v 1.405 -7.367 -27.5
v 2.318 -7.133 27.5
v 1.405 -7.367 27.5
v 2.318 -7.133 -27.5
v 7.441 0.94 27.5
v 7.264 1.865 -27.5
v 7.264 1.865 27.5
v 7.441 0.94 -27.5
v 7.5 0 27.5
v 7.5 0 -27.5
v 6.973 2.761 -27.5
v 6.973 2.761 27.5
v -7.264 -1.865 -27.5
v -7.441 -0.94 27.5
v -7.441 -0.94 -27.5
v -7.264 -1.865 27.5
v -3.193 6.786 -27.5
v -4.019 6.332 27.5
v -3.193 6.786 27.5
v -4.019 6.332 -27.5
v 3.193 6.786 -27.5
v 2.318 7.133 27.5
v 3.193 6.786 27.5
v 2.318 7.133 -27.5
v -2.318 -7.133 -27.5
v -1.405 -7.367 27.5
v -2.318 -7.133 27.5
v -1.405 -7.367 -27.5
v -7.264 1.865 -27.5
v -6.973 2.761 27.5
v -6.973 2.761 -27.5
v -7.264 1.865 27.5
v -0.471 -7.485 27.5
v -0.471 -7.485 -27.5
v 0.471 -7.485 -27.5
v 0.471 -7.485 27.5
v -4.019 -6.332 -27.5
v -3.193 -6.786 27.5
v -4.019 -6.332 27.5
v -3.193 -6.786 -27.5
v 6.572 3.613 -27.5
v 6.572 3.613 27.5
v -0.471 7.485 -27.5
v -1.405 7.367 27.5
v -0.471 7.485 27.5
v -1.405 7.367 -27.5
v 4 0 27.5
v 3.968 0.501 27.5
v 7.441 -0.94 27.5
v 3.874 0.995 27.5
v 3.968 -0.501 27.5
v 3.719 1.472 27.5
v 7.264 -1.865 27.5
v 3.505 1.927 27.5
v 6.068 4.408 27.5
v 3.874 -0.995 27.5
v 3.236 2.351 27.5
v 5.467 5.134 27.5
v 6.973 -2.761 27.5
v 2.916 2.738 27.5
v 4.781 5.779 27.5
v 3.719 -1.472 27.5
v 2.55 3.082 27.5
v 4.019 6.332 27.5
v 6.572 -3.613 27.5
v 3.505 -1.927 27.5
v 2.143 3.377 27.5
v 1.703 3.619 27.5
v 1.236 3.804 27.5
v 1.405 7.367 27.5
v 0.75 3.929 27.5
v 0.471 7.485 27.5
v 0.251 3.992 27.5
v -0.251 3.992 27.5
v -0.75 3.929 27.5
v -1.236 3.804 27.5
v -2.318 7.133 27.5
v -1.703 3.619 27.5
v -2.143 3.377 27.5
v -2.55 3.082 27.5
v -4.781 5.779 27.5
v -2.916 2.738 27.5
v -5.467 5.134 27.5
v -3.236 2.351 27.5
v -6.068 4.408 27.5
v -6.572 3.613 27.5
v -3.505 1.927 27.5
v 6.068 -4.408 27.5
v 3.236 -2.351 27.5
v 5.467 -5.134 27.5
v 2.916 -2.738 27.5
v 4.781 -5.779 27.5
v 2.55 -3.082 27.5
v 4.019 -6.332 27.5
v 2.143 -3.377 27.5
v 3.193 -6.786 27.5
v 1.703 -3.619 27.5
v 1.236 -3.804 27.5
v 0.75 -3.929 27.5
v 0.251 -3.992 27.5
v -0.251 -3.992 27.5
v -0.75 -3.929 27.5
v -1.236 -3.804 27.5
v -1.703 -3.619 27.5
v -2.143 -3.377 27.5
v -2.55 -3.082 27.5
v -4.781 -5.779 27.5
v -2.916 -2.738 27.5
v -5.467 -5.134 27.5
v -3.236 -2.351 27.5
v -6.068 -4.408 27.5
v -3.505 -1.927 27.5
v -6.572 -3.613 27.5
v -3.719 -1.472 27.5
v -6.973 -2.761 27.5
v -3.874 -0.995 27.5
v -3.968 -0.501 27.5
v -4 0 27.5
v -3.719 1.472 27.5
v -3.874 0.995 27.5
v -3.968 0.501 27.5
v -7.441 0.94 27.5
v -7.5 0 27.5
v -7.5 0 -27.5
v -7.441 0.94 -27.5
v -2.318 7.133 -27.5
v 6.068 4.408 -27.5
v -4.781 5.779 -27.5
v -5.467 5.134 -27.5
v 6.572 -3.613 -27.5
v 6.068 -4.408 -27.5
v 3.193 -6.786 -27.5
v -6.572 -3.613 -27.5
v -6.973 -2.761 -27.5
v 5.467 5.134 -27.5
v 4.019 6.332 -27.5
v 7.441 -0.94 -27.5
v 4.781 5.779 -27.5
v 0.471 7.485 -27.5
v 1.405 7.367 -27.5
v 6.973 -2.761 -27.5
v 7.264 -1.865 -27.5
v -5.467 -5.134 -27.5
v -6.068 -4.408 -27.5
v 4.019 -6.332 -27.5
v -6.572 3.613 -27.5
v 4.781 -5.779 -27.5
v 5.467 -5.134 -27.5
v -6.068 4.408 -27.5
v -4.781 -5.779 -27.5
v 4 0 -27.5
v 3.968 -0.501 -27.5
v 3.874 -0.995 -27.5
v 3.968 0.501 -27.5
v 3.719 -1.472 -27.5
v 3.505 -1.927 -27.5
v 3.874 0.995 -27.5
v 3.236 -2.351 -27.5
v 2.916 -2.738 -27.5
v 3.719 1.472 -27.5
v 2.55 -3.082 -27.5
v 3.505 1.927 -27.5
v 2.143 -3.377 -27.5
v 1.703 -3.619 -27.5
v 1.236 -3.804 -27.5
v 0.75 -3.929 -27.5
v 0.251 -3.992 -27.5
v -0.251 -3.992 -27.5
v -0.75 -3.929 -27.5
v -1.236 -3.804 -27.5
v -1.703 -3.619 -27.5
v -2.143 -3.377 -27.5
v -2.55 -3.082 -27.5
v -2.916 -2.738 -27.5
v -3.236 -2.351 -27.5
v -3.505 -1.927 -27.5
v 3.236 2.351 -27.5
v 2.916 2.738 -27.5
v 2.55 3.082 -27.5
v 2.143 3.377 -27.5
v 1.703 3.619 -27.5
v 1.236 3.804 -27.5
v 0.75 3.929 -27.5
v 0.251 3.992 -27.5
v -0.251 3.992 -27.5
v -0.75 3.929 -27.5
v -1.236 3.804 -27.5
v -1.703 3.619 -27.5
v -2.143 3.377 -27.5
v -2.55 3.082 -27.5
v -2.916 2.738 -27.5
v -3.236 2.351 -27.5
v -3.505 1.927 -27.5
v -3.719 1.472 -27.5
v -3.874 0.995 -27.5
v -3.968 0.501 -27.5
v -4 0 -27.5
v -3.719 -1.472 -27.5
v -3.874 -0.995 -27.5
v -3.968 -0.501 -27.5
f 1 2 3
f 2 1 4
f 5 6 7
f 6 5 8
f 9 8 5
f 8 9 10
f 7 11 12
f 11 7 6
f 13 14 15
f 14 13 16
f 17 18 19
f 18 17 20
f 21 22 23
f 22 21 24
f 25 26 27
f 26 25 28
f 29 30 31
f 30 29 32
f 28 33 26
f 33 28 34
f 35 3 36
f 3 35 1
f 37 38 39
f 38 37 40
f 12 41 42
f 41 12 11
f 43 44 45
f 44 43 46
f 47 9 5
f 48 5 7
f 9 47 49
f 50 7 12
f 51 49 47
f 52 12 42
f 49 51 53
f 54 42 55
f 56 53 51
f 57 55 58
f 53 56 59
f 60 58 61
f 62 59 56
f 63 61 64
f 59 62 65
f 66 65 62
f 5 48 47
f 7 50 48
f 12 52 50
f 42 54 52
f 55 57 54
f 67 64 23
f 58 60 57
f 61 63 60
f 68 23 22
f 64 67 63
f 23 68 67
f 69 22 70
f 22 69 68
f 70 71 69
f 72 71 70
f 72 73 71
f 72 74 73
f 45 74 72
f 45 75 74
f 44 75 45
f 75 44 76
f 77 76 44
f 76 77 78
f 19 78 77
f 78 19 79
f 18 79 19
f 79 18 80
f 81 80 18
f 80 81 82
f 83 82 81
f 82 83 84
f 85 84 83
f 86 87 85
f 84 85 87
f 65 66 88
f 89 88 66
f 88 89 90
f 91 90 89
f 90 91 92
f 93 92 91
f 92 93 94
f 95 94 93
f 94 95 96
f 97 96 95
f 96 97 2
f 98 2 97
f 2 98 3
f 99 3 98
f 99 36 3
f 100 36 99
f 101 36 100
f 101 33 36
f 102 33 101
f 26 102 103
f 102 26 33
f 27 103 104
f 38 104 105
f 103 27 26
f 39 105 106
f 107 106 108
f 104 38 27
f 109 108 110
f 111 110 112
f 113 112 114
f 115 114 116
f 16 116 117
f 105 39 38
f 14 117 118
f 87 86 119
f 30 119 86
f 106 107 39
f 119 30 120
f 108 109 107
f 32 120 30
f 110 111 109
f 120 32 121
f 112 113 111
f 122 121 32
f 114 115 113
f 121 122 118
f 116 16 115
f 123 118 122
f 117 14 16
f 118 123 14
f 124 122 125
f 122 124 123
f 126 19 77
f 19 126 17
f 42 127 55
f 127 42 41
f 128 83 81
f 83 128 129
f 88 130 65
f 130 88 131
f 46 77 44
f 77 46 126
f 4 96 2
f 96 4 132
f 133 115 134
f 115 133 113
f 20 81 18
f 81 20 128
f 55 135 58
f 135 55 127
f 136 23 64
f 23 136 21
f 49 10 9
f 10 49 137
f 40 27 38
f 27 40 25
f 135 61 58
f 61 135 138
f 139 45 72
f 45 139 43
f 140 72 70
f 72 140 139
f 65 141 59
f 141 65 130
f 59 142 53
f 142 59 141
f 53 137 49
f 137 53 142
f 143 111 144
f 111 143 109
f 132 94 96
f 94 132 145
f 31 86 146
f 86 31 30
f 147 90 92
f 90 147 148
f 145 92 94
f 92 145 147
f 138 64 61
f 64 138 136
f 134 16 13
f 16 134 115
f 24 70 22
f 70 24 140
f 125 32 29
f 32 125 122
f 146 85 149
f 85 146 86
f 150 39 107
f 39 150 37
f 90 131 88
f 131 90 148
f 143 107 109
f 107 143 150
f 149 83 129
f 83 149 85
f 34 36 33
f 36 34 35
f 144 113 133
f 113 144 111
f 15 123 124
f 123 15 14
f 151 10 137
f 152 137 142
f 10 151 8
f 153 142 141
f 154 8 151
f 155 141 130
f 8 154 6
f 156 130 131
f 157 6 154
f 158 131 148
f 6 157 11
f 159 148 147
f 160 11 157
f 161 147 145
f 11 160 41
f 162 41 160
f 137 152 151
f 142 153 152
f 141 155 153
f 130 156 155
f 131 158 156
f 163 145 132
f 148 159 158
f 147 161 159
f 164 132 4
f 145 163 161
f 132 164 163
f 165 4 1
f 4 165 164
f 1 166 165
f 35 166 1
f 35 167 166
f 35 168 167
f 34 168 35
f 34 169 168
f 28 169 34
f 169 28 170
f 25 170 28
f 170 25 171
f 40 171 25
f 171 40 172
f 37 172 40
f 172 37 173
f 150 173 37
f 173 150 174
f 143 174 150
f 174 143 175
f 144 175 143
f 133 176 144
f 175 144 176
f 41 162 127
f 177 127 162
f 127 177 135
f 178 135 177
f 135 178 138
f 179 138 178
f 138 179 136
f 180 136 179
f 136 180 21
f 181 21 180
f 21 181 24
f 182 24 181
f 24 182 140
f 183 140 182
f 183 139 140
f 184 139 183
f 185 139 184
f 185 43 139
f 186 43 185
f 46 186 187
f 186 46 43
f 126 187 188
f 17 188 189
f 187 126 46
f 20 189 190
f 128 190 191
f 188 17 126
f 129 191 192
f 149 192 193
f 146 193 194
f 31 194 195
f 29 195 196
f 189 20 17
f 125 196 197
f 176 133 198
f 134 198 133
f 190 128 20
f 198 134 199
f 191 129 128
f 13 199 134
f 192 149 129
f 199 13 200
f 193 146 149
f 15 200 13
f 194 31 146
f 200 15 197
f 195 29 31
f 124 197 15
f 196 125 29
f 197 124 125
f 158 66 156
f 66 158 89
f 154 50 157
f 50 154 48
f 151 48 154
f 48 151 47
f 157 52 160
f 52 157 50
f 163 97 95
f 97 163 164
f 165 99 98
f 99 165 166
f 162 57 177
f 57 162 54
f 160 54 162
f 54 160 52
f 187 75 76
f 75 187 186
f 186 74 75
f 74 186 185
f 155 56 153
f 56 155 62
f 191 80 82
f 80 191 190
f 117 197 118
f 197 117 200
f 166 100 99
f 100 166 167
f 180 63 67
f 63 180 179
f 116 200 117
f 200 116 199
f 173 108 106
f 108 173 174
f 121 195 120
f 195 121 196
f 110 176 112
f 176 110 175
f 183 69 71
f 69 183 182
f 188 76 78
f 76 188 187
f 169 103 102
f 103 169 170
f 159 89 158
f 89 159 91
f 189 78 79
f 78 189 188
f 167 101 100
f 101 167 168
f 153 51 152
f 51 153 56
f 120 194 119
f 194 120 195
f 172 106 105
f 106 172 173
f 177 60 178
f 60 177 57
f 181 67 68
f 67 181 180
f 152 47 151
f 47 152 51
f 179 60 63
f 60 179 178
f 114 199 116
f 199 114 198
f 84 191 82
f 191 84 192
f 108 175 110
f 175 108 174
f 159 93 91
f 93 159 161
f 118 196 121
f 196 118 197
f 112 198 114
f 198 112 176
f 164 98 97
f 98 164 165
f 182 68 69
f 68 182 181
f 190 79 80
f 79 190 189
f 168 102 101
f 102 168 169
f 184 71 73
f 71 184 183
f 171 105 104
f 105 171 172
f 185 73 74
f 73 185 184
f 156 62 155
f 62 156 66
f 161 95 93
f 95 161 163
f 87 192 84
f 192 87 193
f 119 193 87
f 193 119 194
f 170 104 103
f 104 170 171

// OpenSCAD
$fn = 50;


difference() {
	union() {
		translate(v = [0, 0, -27.5000000000]) {
			cylinder(h = 55, r = 7.5000000000);
		}
	}
	union() {
		translate(v = [0, 0, -100.0000000000]) {
			cylinder(h = 200, r = 4.0000000000);
		}
	}
}
